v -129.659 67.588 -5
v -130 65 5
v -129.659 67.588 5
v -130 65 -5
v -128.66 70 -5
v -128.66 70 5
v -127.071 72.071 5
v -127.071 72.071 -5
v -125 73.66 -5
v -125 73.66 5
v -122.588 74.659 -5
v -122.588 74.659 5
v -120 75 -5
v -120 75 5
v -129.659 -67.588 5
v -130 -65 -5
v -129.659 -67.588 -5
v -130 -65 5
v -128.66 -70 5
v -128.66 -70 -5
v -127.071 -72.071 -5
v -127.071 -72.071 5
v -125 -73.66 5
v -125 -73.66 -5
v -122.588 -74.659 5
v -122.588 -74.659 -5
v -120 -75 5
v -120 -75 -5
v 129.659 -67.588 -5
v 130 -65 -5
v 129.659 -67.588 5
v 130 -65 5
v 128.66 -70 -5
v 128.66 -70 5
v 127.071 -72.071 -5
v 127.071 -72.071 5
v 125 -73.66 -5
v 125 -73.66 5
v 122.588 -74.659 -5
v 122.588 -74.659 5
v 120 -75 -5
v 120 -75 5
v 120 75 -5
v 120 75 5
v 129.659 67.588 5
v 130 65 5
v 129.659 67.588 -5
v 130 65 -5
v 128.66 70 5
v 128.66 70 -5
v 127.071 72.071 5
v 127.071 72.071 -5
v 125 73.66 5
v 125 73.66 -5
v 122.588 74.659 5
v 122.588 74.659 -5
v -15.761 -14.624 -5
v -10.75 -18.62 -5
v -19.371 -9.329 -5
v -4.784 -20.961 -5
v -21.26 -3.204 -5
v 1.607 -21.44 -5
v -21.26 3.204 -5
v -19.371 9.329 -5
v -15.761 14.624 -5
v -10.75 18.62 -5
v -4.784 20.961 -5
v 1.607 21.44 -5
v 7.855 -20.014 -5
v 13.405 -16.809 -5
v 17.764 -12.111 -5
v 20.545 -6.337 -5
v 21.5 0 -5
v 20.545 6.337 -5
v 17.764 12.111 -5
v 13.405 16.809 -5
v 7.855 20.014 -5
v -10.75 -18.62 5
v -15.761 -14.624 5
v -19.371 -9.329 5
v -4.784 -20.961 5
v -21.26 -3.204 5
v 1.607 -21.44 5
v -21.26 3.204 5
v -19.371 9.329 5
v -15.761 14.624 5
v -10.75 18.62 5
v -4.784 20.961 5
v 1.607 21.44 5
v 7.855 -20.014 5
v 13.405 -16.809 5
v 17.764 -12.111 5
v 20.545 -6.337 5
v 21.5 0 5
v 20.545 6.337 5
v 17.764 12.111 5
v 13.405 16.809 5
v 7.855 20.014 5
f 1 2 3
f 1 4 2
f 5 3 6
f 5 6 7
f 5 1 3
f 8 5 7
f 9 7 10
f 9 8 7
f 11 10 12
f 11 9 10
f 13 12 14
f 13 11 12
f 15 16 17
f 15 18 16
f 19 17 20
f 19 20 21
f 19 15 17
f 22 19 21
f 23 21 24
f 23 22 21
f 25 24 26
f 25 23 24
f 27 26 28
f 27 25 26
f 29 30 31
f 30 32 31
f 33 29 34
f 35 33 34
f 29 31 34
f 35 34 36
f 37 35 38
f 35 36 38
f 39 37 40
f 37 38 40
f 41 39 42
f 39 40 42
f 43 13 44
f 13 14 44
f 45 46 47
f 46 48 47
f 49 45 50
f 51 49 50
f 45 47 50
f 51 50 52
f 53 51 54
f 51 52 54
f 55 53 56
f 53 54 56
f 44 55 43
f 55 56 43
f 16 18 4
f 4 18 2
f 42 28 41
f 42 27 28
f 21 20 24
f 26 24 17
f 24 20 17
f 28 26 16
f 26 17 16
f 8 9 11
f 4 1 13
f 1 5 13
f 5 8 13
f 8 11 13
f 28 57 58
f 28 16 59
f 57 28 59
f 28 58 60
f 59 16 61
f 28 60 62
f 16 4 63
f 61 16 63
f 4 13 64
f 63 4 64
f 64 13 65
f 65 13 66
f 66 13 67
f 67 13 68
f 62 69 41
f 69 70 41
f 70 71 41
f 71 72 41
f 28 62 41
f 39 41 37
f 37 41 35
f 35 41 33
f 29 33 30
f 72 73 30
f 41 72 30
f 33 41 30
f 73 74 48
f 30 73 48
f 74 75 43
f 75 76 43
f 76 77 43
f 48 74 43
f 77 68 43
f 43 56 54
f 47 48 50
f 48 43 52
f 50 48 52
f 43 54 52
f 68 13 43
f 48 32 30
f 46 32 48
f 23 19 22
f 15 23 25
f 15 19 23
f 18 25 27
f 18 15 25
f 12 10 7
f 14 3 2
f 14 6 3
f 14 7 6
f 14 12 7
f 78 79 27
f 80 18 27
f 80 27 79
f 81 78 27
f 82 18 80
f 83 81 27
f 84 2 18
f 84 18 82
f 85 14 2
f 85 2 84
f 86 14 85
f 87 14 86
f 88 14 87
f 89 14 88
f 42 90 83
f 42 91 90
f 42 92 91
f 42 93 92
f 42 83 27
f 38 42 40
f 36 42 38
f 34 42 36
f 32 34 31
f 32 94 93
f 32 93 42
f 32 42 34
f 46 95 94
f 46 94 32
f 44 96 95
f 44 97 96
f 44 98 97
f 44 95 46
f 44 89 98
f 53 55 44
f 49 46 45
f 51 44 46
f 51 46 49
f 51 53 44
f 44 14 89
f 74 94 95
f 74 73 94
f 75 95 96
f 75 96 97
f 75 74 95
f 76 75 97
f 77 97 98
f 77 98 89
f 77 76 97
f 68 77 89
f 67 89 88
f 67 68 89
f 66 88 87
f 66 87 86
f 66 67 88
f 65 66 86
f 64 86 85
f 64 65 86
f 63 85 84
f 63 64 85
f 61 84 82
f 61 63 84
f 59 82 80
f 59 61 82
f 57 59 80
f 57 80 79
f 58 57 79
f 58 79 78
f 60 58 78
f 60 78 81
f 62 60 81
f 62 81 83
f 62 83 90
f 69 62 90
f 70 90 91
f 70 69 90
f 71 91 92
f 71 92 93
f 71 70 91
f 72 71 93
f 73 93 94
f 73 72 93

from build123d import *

# Parameters (mm, degrees)
SKETCH_1_W      = 260
SKETCH_1_H      = 150
SKETCH_1_R      = 21.5
EXTRUDE_1_DEPTH = 5
FILLET_1_R      = 10


with BuildPart() as part:
    # Эскиз1 → Бобышка-Вытянуть1 (new, symmetric)
    with BuildSketch(Plane.XY):
        Rectangle(SKETCH_1_W, SKETCH_1_H)
        Circle(SKETCH_1_R, mode=Mode.SUBTRACT)
    extrude(amount=EXTRUDE_1_DEPTH, both=True)

    # Скругление1
    fillet_1_edges = [part.edges().sort_by_distance(p)[0] for p in [
        (130, -75, 0),
        (-130, -75, 0),
        (-130, 75, 0),
        (130, 75, 0),
    ]]
    fillet(fillet_1_edges, radius=FILLET_1_R)


solid = part.part
